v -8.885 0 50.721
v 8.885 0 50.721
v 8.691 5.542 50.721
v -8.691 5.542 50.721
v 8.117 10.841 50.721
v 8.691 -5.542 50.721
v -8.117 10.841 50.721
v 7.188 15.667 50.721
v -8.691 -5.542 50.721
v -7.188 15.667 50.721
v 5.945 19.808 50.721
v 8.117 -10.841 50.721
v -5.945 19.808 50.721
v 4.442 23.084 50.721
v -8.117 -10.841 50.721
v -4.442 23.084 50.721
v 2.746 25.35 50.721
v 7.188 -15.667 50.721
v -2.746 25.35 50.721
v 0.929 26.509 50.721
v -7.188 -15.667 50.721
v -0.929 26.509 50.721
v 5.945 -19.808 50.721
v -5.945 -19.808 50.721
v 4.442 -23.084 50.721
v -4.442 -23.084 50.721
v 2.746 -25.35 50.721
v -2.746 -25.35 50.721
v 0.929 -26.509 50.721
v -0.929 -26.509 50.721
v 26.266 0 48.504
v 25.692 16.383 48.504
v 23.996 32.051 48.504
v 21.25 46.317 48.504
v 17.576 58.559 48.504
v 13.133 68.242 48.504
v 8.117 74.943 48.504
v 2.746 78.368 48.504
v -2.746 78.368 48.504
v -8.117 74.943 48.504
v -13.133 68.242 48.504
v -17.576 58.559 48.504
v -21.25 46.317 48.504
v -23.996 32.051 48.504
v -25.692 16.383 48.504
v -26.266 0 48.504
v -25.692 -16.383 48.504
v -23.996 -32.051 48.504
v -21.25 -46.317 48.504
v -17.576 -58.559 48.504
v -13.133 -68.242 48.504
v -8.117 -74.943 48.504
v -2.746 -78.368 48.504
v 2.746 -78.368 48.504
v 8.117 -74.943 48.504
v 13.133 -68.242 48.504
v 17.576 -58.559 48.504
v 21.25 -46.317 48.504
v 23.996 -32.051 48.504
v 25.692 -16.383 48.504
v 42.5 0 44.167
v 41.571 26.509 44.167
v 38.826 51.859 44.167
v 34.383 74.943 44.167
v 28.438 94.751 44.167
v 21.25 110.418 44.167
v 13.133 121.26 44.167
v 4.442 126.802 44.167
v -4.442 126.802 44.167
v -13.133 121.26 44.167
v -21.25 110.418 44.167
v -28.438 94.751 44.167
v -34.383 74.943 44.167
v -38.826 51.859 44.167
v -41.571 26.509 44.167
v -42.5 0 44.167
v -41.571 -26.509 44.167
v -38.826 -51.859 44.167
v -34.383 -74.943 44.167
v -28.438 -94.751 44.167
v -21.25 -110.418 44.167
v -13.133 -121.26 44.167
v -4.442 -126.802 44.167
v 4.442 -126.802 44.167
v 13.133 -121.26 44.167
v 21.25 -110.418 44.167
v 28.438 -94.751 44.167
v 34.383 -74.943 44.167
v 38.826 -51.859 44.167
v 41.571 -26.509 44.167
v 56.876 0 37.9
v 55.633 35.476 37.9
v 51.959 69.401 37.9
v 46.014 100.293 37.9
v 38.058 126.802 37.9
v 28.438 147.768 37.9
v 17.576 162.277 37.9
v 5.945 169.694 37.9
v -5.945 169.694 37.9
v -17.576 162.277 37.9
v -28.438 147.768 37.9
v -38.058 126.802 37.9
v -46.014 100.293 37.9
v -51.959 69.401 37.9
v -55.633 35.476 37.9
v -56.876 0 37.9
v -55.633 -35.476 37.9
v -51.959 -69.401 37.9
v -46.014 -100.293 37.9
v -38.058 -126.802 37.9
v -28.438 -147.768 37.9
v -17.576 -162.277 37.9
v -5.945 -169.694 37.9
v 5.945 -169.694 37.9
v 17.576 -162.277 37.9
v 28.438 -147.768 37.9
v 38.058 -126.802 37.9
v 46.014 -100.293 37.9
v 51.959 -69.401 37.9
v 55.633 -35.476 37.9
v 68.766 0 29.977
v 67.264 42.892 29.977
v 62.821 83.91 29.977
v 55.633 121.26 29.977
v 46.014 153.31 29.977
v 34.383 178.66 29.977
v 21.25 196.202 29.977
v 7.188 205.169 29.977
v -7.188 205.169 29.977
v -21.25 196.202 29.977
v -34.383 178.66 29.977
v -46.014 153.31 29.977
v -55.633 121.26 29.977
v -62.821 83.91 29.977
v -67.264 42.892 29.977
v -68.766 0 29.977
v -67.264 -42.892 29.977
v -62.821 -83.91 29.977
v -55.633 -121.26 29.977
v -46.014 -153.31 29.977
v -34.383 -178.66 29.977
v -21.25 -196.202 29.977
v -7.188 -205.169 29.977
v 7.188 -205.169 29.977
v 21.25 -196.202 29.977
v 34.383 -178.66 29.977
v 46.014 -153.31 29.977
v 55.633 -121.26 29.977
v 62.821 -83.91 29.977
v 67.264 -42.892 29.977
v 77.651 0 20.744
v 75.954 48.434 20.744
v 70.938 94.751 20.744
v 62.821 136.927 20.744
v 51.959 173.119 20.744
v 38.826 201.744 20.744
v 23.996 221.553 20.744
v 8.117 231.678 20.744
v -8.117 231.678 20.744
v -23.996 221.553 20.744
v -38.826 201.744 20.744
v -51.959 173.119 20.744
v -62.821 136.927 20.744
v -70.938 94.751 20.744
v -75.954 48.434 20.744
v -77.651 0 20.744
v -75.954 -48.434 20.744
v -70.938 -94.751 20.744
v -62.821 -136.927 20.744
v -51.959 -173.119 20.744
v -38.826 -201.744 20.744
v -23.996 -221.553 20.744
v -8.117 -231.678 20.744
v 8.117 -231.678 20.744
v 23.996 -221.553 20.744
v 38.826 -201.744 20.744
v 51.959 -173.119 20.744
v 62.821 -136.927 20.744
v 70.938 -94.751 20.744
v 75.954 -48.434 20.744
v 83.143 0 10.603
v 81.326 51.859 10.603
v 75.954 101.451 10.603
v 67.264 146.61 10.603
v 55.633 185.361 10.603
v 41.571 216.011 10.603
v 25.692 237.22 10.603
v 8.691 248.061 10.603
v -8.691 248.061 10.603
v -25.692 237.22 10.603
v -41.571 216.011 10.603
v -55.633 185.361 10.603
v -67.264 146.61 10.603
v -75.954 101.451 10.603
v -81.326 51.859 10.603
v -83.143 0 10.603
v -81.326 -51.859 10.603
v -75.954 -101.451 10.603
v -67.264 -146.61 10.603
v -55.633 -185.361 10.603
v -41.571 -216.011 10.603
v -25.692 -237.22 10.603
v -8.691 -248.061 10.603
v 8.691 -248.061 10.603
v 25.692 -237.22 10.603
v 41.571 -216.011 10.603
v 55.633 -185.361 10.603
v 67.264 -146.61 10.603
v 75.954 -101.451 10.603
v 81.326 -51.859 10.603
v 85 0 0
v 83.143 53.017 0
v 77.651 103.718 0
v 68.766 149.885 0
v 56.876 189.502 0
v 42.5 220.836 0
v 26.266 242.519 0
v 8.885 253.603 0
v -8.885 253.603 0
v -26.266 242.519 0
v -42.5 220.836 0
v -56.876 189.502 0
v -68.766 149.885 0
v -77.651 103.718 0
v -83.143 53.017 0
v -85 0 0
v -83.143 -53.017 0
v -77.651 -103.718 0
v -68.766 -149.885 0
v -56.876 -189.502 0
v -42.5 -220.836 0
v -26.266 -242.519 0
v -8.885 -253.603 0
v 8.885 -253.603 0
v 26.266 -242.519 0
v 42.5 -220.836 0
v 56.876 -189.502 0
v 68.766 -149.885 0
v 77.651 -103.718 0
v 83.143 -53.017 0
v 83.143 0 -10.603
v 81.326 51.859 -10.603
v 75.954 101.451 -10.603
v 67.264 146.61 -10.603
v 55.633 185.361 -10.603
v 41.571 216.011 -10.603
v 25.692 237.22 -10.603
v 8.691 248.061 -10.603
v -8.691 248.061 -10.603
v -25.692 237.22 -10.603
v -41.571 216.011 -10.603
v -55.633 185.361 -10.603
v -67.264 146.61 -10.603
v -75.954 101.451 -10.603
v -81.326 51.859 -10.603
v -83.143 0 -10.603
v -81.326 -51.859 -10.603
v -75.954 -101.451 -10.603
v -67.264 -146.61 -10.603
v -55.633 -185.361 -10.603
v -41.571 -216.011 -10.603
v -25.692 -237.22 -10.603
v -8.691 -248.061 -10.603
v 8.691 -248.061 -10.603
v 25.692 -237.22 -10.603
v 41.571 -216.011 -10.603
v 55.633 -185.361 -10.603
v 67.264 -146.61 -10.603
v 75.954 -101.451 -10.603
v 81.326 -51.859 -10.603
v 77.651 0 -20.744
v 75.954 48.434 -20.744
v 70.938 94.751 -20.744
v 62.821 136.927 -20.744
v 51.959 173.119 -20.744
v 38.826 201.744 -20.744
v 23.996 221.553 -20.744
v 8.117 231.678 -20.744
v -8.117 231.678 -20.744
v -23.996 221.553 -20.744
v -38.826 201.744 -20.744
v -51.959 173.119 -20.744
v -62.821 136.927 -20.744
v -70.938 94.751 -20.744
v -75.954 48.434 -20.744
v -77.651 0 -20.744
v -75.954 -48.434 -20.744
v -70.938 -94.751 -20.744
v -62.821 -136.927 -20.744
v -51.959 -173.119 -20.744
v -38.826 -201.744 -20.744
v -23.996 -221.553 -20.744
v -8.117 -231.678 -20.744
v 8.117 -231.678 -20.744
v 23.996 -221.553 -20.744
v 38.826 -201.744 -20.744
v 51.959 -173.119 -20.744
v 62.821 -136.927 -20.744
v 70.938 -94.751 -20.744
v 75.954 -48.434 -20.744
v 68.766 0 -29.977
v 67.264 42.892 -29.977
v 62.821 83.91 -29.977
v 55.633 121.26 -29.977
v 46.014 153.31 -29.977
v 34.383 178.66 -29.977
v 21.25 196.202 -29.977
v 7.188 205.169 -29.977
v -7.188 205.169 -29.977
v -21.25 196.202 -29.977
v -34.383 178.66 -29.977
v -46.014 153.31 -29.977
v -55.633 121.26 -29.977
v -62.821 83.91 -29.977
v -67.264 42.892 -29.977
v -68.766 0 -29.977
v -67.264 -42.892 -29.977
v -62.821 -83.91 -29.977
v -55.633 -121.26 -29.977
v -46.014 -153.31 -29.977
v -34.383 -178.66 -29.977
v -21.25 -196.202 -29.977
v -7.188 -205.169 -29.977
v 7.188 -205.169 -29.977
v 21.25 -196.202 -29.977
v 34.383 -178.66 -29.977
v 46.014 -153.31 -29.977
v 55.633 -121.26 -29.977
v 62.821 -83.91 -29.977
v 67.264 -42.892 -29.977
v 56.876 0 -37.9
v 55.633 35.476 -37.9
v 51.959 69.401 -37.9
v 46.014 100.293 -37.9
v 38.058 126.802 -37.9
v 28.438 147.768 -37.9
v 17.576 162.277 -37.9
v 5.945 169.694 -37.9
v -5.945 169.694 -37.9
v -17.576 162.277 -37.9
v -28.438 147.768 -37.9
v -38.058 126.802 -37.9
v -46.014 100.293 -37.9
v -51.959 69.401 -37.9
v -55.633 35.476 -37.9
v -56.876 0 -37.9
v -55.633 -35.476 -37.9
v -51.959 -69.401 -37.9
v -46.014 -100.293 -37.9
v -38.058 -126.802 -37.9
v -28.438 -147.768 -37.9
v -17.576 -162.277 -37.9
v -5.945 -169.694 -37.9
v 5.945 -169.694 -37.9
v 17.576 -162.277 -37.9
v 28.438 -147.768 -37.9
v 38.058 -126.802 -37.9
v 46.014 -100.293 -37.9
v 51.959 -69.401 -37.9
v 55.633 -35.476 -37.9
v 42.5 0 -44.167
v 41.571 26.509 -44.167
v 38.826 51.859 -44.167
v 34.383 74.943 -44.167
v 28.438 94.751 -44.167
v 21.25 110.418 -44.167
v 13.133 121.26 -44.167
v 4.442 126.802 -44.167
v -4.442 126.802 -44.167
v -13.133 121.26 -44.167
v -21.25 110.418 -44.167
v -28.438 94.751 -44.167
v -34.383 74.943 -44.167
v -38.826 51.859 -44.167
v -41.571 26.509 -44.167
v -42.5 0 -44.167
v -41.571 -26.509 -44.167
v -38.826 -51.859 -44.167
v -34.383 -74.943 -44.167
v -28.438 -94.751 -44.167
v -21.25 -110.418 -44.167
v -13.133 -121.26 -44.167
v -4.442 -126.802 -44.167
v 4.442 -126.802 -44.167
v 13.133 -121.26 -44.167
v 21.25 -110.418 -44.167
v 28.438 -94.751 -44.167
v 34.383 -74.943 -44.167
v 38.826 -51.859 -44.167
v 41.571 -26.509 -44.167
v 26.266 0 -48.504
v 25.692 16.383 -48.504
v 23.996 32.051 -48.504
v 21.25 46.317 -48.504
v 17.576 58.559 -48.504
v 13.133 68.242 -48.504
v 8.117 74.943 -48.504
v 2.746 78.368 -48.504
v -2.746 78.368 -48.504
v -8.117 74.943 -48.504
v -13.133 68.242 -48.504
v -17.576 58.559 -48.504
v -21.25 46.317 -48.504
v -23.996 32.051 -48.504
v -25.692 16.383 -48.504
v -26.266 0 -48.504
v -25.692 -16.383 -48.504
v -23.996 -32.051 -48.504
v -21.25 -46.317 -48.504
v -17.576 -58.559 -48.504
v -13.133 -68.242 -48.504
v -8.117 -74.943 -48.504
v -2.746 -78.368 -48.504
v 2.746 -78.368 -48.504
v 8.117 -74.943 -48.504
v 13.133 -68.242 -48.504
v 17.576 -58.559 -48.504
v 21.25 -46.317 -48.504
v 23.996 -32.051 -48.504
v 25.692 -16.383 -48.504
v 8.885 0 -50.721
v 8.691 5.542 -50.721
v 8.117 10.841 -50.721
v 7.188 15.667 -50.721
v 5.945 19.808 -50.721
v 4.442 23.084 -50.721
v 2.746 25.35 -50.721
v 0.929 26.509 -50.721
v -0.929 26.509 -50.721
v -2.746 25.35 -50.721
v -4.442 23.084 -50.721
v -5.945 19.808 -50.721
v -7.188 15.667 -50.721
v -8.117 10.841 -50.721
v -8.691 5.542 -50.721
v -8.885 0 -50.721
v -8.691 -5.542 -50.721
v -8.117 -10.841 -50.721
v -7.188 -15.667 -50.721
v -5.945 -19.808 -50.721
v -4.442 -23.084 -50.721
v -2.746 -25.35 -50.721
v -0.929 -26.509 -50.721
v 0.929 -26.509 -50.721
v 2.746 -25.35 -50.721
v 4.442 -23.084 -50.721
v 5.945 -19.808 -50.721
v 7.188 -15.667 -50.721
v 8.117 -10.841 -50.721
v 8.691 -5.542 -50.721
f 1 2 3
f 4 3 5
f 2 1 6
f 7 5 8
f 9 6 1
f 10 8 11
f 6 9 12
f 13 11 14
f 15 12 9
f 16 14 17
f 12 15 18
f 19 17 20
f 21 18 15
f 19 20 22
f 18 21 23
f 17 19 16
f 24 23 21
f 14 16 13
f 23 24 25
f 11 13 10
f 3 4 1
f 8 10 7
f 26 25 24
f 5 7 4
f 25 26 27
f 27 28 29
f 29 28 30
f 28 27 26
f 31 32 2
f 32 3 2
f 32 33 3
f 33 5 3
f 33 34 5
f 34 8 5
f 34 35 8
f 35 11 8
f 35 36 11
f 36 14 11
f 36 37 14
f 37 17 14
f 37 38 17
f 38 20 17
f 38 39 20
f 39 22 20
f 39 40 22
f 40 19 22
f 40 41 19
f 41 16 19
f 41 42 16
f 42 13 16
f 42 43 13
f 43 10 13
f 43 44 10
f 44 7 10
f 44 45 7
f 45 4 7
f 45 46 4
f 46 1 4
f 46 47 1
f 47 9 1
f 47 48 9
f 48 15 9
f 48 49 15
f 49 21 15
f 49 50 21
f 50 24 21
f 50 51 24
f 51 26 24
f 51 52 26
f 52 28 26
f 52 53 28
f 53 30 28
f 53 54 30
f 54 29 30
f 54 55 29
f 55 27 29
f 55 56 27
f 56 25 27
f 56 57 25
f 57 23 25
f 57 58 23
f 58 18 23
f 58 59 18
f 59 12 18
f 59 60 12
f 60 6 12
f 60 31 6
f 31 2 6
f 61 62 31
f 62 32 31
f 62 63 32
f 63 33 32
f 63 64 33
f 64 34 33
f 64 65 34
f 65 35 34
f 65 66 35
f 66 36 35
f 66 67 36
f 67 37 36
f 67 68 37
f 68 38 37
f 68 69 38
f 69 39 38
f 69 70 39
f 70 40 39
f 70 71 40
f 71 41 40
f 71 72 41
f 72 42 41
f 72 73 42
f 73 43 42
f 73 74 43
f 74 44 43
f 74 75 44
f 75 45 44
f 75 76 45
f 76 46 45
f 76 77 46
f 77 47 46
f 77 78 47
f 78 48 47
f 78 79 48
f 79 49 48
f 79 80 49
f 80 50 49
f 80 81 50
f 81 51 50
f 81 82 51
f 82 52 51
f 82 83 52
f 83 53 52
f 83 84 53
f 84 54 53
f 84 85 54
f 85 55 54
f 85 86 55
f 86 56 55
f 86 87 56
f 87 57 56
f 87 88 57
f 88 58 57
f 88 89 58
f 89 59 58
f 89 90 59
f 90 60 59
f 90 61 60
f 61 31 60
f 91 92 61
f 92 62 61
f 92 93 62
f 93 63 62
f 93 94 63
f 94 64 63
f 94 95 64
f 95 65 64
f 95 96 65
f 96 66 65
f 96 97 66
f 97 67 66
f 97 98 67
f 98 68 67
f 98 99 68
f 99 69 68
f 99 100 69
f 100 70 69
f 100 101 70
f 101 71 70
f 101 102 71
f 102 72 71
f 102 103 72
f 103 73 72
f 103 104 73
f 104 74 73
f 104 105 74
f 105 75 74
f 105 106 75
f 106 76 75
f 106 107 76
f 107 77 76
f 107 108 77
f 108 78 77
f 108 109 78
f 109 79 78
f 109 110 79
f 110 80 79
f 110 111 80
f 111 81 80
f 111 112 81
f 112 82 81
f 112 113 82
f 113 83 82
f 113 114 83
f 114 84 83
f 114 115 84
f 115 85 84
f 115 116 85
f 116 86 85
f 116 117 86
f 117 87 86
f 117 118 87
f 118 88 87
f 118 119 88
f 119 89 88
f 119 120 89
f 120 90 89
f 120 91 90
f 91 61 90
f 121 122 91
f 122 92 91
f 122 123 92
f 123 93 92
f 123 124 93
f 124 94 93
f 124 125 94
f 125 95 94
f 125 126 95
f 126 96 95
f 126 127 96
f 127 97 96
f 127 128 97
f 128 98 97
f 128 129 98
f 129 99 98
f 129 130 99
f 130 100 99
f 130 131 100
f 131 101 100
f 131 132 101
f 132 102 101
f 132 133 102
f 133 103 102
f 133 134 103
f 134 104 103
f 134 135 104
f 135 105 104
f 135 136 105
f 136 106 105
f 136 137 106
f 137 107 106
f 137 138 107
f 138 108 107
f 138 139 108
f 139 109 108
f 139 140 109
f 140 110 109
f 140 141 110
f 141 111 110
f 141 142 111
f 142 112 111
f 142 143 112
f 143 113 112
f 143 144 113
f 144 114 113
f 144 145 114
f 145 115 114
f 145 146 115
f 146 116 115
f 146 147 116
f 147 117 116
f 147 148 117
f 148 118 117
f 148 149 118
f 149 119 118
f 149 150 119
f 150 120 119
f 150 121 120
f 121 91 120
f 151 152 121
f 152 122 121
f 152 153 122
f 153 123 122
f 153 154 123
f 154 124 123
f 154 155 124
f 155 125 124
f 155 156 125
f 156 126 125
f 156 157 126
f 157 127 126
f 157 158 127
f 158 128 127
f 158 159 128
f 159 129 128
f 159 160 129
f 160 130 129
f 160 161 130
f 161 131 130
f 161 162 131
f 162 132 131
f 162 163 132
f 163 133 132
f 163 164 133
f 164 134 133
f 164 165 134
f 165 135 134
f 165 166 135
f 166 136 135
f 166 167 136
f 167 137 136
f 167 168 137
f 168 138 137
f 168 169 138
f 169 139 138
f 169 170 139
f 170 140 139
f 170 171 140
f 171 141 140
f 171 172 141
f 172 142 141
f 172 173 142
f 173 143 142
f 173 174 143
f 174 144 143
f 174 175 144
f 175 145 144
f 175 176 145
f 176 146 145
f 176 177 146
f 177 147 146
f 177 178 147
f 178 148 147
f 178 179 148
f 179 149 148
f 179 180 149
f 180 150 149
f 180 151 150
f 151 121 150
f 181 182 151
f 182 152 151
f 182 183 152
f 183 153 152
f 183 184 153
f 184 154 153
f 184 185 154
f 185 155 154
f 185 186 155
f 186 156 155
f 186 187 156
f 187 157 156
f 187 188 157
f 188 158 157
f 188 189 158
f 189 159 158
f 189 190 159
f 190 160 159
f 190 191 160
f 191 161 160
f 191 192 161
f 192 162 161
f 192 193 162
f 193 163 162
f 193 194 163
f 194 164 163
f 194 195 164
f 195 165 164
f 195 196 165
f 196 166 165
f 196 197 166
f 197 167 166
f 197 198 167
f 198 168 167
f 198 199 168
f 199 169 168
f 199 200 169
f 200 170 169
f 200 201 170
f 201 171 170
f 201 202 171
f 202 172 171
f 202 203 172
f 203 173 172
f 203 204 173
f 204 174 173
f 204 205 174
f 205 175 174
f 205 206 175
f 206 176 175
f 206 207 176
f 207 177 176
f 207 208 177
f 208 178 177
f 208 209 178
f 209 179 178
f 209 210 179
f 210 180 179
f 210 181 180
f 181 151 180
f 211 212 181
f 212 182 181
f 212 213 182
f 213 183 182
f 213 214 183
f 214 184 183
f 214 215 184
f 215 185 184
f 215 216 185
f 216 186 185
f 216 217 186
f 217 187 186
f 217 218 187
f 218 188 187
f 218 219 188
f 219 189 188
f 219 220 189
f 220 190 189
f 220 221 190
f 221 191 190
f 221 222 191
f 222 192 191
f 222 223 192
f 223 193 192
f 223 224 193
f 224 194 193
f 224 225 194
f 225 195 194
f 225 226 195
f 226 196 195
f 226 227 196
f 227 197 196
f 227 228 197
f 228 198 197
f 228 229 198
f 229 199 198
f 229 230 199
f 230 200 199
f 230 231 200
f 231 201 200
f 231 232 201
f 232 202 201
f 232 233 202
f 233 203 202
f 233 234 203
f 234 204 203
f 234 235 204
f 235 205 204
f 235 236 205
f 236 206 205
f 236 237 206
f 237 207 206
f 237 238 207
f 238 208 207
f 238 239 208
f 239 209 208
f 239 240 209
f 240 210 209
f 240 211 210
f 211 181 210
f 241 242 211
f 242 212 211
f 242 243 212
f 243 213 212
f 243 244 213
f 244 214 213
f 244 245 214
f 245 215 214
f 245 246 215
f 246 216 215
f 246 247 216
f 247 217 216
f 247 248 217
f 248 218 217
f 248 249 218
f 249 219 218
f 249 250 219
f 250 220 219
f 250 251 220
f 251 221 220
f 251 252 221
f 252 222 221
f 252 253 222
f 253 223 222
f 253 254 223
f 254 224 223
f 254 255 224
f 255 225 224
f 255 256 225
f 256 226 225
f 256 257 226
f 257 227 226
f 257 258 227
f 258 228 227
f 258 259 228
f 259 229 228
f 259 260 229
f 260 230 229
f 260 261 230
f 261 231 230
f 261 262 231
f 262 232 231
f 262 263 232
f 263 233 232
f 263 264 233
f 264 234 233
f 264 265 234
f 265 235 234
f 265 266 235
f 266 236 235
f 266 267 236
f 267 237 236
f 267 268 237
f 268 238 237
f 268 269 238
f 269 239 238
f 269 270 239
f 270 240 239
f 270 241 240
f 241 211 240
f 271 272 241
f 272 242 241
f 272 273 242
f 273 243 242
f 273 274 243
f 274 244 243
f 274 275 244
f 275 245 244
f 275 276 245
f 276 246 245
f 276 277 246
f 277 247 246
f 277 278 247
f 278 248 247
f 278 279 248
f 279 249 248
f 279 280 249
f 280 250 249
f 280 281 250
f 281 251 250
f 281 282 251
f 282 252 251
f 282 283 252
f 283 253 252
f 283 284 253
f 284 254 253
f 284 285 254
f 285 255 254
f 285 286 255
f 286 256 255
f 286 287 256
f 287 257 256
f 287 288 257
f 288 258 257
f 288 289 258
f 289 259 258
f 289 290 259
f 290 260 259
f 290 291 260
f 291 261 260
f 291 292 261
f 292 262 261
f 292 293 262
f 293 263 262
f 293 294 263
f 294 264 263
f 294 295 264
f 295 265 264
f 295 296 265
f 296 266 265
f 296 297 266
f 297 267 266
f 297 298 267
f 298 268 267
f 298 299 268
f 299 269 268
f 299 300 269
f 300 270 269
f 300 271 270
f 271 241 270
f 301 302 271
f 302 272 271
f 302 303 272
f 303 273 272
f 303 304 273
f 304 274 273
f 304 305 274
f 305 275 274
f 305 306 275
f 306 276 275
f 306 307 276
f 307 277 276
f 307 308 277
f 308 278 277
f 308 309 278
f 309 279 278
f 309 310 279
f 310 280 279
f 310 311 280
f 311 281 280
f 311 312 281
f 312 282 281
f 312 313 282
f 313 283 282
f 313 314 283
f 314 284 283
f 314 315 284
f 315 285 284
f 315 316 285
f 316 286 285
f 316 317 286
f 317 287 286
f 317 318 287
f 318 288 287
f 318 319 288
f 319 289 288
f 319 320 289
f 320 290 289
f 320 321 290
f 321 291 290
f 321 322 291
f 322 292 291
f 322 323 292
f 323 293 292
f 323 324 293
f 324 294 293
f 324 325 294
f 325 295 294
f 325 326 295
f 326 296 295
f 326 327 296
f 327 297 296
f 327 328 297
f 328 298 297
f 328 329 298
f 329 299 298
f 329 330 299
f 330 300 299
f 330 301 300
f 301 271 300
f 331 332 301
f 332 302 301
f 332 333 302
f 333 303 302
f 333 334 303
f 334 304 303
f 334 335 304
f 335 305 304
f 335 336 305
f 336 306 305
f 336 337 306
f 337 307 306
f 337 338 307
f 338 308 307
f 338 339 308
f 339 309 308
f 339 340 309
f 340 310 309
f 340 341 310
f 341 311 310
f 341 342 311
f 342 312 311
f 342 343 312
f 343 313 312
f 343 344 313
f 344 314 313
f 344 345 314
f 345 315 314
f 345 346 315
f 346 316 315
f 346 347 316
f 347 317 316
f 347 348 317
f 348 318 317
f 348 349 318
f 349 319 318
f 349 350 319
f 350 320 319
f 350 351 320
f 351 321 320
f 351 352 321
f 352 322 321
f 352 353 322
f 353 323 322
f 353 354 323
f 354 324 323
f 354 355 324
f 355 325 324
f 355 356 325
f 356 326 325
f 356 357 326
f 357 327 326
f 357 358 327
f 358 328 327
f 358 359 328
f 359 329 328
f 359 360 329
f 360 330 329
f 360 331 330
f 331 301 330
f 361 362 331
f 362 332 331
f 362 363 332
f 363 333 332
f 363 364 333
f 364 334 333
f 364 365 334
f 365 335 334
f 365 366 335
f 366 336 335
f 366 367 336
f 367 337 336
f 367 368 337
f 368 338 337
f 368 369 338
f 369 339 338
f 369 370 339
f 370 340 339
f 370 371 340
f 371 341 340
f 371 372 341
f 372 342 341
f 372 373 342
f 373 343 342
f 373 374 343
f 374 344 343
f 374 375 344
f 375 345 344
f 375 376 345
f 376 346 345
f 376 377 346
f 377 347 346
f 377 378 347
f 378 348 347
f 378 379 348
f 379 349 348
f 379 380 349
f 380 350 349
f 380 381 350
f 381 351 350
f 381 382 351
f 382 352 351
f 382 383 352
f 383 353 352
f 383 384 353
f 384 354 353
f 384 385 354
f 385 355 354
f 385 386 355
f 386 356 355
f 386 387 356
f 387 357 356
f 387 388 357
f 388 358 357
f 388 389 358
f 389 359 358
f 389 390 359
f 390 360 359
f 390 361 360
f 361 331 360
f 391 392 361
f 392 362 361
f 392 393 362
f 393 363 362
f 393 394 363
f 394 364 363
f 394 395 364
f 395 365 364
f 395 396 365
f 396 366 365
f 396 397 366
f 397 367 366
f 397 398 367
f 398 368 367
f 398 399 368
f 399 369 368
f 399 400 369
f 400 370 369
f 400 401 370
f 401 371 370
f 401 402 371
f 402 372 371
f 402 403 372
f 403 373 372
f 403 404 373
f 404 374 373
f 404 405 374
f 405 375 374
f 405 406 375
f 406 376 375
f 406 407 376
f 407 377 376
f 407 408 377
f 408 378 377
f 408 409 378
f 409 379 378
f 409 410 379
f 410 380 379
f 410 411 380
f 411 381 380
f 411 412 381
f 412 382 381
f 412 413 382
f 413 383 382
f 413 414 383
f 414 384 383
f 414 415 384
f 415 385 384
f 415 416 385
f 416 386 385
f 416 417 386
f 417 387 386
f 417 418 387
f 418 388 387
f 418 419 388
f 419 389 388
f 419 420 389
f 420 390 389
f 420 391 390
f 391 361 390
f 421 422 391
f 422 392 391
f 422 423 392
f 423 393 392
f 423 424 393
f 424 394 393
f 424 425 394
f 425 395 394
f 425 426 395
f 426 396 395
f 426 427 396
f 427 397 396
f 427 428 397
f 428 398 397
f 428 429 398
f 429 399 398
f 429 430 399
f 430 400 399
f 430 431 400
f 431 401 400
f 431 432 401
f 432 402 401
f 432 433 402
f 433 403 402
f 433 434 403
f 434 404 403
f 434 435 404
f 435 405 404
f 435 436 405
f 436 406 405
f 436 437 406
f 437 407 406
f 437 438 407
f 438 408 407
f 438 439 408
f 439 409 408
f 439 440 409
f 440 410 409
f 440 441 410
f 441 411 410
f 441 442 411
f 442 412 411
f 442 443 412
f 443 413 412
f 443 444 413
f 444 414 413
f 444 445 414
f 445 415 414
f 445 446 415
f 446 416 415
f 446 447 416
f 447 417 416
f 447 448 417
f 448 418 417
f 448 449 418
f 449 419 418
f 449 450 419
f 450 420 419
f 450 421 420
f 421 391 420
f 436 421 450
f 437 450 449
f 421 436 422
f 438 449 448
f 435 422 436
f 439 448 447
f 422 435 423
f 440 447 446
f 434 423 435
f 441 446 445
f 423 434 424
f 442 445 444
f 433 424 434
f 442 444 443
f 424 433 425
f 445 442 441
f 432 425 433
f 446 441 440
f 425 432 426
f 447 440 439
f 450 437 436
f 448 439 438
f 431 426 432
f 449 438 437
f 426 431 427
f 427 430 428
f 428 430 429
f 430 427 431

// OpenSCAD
// Generated by SolidPython 1.0.1 on 2020-07-29 00:46:46


scale(v = [5, 15, 3]) {
	sphere(r = 17);
}
/***********************************************
*********      SolidPython code:      **********
************************************************
 
# import packages: SolidPython
from solid import *
from solid.utils import *
from itertools import chain, combinations, permutations


class Resize:

    def __init__(self, scad_file):
        self.scad_file = scad_file
        #self.scad_file = import_scad(scad_file)
        # cone/cylinder param:
        self.r1 = 0
        self.r2 = 0
        self.h = 0
        # rectangular prism param:
        self.w = 0
        self.l = 0
        # ellipse param:
        self.r = 0

    # import OpenScad code (file name corresponds to shape)


    # classify shape + parameters
    def assign(self, param1, param2, param3):
        if self.scad_file == 'cone.scad':
            self.r1 = param1
            self.r2 = param2
            self.h = param3
        elif self.scad_file == 'cylinder.scad':
            self.r1 = param1
            self.r2 = param2
            self.h = param3
        elif self.scad_file == 'rectangularPrism.scad':
            self.h = param1
            self.l = param2
            self.w = param3
        else:
            self.r = param1
            self.h = param2

    # resize parameters
    def iterate(self):
        x = range(3, 20, 2)
        i = 1
        if self.scad_file == 'cone.scad':
            tempList = list(permutations(x, 2))
            for temp in tempList:
                param1 = temp[0]
                param2 = temp[1]
                filepath = 'produced_scad_files/' + 'cone' + str(param1) + '_' + str(param2) + '_' + '.scad'
                scad_render_to_file(cylinder(h=param1, r1=param2, r2=0), filepath)

        elif self.scad_file == 'cylinder.scad':
            tempList = list(permutations(x, 3))
            for temp in tempList:
                param1 = temp[0]
                param2 = temp[1]
                filepath = 'produced_scad_files/' + 'cylinder' + str(param1) + '_' + str(param2) + '_' + '.scad'
                scad_render_to_file(cylinder(h=param1, r1=param2, r2=param2), filepath)

        elif self.scad_file == 'rectangularPrism.scad':
            tempList = list(permutations(x, 3))
            for temp in tempList:
                param1 = temp[0]
                param2 = temp[1]
                param3 = temp[2]
                filepath = 'produced_scad_files/' + 'rectangularPrism' + str(param1) + '_' + str(param2) + '_' + str(
                    param3) + '.scad'
                scad_render_to_file(cube(size=(param1, param2, param3)), filepath)

        elif self.scad_file == 'ellipse.scad':
            tempList = list(permutations(x, 4))
            for temp in tempList:
                param1 = temp[0]
                param2 = temp[1]
                param3 = temp[2]
                param4 = temp[3]
                filepath = 'produced_scad_files/' + 'ellipse' + str(param1) + '_' + str(param2) + '_' + str(param3) + '_' + str(param4) + '.scad'
                scad_render_to_file(scale([param1, param2, param3])(sphere(r=param4)), filepath)

    def render_to_scadfile(self):
        scad_render_to_file(scad, 'example.scad') 
 
************************************************/
